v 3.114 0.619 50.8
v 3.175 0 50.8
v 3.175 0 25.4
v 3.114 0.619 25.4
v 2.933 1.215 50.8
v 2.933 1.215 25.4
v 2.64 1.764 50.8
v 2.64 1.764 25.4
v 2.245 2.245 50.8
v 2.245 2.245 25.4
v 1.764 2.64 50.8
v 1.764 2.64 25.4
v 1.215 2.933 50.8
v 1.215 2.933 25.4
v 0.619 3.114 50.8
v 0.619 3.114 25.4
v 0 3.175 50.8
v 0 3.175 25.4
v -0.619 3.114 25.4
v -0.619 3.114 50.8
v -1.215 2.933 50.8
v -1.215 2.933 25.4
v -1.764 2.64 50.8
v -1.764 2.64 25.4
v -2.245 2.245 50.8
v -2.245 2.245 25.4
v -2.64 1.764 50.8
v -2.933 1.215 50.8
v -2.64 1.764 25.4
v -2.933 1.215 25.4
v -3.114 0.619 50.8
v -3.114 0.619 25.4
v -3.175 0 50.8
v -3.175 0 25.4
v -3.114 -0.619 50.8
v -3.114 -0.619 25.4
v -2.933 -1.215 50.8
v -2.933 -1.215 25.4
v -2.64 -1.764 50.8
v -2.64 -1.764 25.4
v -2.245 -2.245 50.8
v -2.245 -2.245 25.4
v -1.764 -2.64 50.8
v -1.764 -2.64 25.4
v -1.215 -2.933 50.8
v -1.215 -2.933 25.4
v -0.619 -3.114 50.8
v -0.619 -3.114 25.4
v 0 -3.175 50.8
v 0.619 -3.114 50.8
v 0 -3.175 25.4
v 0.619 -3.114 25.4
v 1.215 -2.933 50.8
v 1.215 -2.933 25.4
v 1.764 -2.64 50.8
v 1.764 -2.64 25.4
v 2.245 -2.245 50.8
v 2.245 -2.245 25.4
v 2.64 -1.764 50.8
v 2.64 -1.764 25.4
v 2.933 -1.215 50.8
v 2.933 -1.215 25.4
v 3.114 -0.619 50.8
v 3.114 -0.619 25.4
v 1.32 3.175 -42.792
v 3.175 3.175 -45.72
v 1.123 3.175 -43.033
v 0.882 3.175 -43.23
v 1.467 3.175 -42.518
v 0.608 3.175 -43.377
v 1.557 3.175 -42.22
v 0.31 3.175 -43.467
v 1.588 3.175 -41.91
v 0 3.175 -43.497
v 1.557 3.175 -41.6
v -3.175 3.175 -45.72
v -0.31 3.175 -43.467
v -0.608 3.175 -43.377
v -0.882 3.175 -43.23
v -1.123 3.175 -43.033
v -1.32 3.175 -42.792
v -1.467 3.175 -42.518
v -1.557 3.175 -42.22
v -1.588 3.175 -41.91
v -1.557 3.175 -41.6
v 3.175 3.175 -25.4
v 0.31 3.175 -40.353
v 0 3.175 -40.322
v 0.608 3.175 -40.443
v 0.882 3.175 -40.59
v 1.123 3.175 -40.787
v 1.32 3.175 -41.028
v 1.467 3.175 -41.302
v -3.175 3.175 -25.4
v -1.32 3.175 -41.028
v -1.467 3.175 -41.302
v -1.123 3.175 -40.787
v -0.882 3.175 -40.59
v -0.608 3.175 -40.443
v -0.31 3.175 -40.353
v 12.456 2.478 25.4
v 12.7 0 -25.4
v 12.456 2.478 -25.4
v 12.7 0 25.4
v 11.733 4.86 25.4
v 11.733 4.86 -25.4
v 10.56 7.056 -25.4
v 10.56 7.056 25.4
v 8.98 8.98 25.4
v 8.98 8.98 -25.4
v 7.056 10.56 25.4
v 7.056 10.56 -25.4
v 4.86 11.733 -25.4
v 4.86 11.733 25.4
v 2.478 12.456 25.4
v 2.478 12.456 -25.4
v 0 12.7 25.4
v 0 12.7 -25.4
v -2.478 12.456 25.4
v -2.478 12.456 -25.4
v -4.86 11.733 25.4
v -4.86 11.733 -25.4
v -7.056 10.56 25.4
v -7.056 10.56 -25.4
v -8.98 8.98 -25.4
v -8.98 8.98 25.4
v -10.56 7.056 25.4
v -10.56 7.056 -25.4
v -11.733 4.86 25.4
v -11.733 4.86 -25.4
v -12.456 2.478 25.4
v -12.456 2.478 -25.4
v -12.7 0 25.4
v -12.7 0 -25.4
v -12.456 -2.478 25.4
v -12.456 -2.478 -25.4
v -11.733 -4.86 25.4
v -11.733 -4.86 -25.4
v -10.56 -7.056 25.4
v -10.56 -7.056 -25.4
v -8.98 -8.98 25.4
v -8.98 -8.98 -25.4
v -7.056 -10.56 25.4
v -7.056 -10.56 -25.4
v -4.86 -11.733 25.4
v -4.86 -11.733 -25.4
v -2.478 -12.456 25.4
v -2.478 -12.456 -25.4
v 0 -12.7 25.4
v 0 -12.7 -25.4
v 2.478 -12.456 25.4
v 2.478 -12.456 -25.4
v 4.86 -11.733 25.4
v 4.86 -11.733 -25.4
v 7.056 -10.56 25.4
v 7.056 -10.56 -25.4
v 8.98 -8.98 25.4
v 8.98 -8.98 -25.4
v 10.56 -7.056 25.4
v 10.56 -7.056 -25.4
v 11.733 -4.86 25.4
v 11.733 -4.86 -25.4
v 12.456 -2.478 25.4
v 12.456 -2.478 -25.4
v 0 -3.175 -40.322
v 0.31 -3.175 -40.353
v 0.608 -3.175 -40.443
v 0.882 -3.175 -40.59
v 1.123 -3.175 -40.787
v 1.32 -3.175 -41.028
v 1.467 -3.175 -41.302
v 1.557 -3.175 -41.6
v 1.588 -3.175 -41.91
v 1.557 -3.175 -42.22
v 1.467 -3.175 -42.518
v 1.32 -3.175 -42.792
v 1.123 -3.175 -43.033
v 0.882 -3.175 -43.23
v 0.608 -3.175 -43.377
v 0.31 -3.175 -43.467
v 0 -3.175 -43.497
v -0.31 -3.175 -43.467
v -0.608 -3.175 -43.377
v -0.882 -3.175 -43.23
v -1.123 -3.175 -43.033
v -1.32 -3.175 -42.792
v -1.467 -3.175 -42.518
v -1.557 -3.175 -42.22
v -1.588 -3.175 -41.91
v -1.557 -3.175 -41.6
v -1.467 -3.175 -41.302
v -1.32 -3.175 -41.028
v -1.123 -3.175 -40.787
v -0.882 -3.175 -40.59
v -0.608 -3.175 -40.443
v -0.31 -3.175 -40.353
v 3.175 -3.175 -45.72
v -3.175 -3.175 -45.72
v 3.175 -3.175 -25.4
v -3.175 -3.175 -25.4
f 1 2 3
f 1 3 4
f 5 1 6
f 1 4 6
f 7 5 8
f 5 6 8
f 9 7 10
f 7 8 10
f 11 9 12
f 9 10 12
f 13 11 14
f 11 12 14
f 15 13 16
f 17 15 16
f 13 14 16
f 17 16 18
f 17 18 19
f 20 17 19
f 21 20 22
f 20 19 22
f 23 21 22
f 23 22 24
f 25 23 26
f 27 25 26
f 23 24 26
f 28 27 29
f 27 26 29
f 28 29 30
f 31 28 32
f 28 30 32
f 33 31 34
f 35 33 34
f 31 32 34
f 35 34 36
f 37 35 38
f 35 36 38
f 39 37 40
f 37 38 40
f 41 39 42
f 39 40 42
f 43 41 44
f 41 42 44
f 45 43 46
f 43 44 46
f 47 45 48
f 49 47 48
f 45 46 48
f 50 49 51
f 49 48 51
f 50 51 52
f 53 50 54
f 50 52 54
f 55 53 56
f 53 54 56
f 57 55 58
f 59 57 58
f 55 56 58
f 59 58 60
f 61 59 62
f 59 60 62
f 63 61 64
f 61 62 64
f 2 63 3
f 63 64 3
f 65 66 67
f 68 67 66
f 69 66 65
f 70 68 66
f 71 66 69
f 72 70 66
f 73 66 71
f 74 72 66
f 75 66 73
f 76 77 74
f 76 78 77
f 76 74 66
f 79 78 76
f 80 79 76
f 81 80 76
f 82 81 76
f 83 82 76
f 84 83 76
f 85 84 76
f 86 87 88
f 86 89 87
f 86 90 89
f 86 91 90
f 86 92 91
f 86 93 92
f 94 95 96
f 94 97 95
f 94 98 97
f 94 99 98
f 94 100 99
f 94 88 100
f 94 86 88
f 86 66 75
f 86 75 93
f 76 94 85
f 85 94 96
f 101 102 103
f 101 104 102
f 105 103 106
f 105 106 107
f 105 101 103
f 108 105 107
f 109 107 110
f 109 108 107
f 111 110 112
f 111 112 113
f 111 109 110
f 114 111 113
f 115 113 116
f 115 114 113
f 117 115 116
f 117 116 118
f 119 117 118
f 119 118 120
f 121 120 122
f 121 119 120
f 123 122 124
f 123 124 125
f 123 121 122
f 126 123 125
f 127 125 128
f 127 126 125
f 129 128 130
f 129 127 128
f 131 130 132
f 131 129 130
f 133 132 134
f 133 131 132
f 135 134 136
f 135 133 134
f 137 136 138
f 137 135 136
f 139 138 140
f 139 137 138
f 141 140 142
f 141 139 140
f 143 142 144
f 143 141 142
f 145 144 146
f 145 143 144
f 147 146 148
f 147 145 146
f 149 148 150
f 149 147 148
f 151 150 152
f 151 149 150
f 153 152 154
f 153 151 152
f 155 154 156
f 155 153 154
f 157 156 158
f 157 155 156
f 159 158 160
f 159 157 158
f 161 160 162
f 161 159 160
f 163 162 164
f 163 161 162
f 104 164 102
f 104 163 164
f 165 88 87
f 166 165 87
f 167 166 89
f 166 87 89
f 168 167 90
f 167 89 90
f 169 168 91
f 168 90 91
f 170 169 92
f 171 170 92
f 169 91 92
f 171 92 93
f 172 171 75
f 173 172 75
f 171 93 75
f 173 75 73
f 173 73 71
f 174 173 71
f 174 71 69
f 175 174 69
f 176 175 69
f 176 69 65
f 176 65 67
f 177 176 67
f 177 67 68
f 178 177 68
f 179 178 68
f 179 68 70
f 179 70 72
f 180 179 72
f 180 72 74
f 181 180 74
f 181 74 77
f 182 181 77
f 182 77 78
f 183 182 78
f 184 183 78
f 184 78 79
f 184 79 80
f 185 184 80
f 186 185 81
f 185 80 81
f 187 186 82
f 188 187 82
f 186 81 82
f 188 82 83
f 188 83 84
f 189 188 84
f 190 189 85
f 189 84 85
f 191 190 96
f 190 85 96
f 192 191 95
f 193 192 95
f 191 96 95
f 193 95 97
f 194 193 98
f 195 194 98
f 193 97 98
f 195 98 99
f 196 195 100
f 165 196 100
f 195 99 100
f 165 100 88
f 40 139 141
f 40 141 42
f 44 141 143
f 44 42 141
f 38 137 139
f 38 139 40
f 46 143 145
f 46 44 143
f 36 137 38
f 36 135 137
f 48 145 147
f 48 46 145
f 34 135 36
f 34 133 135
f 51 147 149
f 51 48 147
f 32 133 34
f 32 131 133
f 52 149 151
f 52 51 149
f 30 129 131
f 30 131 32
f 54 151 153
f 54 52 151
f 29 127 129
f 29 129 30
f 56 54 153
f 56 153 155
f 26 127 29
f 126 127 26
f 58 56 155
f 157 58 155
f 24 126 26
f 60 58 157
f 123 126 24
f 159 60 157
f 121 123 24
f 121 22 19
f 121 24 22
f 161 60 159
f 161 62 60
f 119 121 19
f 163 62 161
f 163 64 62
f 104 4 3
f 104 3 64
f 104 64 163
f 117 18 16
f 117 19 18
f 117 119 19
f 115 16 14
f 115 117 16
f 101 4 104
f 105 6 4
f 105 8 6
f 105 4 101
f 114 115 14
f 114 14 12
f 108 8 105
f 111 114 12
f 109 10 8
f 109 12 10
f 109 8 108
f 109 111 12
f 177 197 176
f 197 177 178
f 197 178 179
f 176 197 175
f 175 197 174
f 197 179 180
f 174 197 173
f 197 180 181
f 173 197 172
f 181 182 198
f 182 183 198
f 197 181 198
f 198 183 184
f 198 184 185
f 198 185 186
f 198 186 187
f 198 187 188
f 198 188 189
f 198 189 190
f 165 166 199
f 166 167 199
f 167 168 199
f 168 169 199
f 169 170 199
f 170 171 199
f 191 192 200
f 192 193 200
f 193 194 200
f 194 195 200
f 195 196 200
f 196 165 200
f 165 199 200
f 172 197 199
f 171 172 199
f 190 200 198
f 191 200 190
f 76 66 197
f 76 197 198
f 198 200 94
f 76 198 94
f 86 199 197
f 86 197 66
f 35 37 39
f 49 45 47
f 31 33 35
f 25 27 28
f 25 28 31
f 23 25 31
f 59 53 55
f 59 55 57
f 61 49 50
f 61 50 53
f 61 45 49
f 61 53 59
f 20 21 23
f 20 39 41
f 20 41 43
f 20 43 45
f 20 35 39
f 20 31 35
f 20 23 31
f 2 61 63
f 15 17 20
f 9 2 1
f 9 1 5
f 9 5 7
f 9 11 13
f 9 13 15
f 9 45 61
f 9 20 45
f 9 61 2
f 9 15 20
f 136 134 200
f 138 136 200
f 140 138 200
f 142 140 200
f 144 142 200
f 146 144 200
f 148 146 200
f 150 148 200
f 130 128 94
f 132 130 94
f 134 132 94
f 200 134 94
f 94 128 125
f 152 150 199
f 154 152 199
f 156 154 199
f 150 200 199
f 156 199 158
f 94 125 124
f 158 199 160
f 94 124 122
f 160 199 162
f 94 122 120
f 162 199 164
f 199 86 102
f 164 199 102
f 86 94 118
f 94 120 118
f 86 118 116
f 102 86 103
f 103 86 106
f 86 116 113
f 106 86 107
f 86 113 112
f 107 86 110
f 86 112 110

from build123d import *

# Parameters (mm, degrees)
SKETCH1_R           = 12.7
BOSS_EXTRUDE1_DEPTH = 25.4
SKETCH2_R           = 3.175
BOSS_EXTRUDE2_DEPTH = 25.4
SKETCH3_W           = 6.35
SKETCH3_H           = 6.35
BOSS_EXTRUDE3_DEPTH = 20.32
SKETCH4_R           = 1.5875
CUT_EXTRUDE1_DEPTH  = 55.716959208


with BuildPart() as part:
    # Sketch1 → Boss-Extrude1 (new, symmetric)
    with BuildSketch(Plane.XY):
        Circle(SKETCH1_R)
    extrude(amount=BOSS_EXTRUDE1_DEPTH, both=True)

    # Sketch2 → Boss-Extrude2 (add)
    with BuildSketch(Plane.XY.offset(25.4)):
        Circle(SKETCH2_R)
    extrude(amount=BOSS_EXTRUDE2_DEPTH)

    # Sketch3 → Boss-Extrude3 (add)
    with BuildSketch(Plane(origin=(0, 0, -25.4), x_dir=(-1, 0, 0), z_dir=(0, 0, -1))):
        Rectangle(SKETCH3_W, SKETCH3_H)
    extrude(amount=BOSS_EXTRUDE3_DEPTH)

    # Sketch4 → Cut-Extrude1 (cut, through all)
    with BuildSketch(Plane(origin=(0, 3.175, 0), x_dir=(1, 0, 0), z_dir=(0, 1, 0))):
        with Locations(Location((0, 41.91, 0), (0, 0, 270))):
            Circle(SKETCH4_R)
    extrude(amount=-CUT_EXTRUDE1_DEPTH, mode=Mode.SUBTRACT)


solid = part.part
